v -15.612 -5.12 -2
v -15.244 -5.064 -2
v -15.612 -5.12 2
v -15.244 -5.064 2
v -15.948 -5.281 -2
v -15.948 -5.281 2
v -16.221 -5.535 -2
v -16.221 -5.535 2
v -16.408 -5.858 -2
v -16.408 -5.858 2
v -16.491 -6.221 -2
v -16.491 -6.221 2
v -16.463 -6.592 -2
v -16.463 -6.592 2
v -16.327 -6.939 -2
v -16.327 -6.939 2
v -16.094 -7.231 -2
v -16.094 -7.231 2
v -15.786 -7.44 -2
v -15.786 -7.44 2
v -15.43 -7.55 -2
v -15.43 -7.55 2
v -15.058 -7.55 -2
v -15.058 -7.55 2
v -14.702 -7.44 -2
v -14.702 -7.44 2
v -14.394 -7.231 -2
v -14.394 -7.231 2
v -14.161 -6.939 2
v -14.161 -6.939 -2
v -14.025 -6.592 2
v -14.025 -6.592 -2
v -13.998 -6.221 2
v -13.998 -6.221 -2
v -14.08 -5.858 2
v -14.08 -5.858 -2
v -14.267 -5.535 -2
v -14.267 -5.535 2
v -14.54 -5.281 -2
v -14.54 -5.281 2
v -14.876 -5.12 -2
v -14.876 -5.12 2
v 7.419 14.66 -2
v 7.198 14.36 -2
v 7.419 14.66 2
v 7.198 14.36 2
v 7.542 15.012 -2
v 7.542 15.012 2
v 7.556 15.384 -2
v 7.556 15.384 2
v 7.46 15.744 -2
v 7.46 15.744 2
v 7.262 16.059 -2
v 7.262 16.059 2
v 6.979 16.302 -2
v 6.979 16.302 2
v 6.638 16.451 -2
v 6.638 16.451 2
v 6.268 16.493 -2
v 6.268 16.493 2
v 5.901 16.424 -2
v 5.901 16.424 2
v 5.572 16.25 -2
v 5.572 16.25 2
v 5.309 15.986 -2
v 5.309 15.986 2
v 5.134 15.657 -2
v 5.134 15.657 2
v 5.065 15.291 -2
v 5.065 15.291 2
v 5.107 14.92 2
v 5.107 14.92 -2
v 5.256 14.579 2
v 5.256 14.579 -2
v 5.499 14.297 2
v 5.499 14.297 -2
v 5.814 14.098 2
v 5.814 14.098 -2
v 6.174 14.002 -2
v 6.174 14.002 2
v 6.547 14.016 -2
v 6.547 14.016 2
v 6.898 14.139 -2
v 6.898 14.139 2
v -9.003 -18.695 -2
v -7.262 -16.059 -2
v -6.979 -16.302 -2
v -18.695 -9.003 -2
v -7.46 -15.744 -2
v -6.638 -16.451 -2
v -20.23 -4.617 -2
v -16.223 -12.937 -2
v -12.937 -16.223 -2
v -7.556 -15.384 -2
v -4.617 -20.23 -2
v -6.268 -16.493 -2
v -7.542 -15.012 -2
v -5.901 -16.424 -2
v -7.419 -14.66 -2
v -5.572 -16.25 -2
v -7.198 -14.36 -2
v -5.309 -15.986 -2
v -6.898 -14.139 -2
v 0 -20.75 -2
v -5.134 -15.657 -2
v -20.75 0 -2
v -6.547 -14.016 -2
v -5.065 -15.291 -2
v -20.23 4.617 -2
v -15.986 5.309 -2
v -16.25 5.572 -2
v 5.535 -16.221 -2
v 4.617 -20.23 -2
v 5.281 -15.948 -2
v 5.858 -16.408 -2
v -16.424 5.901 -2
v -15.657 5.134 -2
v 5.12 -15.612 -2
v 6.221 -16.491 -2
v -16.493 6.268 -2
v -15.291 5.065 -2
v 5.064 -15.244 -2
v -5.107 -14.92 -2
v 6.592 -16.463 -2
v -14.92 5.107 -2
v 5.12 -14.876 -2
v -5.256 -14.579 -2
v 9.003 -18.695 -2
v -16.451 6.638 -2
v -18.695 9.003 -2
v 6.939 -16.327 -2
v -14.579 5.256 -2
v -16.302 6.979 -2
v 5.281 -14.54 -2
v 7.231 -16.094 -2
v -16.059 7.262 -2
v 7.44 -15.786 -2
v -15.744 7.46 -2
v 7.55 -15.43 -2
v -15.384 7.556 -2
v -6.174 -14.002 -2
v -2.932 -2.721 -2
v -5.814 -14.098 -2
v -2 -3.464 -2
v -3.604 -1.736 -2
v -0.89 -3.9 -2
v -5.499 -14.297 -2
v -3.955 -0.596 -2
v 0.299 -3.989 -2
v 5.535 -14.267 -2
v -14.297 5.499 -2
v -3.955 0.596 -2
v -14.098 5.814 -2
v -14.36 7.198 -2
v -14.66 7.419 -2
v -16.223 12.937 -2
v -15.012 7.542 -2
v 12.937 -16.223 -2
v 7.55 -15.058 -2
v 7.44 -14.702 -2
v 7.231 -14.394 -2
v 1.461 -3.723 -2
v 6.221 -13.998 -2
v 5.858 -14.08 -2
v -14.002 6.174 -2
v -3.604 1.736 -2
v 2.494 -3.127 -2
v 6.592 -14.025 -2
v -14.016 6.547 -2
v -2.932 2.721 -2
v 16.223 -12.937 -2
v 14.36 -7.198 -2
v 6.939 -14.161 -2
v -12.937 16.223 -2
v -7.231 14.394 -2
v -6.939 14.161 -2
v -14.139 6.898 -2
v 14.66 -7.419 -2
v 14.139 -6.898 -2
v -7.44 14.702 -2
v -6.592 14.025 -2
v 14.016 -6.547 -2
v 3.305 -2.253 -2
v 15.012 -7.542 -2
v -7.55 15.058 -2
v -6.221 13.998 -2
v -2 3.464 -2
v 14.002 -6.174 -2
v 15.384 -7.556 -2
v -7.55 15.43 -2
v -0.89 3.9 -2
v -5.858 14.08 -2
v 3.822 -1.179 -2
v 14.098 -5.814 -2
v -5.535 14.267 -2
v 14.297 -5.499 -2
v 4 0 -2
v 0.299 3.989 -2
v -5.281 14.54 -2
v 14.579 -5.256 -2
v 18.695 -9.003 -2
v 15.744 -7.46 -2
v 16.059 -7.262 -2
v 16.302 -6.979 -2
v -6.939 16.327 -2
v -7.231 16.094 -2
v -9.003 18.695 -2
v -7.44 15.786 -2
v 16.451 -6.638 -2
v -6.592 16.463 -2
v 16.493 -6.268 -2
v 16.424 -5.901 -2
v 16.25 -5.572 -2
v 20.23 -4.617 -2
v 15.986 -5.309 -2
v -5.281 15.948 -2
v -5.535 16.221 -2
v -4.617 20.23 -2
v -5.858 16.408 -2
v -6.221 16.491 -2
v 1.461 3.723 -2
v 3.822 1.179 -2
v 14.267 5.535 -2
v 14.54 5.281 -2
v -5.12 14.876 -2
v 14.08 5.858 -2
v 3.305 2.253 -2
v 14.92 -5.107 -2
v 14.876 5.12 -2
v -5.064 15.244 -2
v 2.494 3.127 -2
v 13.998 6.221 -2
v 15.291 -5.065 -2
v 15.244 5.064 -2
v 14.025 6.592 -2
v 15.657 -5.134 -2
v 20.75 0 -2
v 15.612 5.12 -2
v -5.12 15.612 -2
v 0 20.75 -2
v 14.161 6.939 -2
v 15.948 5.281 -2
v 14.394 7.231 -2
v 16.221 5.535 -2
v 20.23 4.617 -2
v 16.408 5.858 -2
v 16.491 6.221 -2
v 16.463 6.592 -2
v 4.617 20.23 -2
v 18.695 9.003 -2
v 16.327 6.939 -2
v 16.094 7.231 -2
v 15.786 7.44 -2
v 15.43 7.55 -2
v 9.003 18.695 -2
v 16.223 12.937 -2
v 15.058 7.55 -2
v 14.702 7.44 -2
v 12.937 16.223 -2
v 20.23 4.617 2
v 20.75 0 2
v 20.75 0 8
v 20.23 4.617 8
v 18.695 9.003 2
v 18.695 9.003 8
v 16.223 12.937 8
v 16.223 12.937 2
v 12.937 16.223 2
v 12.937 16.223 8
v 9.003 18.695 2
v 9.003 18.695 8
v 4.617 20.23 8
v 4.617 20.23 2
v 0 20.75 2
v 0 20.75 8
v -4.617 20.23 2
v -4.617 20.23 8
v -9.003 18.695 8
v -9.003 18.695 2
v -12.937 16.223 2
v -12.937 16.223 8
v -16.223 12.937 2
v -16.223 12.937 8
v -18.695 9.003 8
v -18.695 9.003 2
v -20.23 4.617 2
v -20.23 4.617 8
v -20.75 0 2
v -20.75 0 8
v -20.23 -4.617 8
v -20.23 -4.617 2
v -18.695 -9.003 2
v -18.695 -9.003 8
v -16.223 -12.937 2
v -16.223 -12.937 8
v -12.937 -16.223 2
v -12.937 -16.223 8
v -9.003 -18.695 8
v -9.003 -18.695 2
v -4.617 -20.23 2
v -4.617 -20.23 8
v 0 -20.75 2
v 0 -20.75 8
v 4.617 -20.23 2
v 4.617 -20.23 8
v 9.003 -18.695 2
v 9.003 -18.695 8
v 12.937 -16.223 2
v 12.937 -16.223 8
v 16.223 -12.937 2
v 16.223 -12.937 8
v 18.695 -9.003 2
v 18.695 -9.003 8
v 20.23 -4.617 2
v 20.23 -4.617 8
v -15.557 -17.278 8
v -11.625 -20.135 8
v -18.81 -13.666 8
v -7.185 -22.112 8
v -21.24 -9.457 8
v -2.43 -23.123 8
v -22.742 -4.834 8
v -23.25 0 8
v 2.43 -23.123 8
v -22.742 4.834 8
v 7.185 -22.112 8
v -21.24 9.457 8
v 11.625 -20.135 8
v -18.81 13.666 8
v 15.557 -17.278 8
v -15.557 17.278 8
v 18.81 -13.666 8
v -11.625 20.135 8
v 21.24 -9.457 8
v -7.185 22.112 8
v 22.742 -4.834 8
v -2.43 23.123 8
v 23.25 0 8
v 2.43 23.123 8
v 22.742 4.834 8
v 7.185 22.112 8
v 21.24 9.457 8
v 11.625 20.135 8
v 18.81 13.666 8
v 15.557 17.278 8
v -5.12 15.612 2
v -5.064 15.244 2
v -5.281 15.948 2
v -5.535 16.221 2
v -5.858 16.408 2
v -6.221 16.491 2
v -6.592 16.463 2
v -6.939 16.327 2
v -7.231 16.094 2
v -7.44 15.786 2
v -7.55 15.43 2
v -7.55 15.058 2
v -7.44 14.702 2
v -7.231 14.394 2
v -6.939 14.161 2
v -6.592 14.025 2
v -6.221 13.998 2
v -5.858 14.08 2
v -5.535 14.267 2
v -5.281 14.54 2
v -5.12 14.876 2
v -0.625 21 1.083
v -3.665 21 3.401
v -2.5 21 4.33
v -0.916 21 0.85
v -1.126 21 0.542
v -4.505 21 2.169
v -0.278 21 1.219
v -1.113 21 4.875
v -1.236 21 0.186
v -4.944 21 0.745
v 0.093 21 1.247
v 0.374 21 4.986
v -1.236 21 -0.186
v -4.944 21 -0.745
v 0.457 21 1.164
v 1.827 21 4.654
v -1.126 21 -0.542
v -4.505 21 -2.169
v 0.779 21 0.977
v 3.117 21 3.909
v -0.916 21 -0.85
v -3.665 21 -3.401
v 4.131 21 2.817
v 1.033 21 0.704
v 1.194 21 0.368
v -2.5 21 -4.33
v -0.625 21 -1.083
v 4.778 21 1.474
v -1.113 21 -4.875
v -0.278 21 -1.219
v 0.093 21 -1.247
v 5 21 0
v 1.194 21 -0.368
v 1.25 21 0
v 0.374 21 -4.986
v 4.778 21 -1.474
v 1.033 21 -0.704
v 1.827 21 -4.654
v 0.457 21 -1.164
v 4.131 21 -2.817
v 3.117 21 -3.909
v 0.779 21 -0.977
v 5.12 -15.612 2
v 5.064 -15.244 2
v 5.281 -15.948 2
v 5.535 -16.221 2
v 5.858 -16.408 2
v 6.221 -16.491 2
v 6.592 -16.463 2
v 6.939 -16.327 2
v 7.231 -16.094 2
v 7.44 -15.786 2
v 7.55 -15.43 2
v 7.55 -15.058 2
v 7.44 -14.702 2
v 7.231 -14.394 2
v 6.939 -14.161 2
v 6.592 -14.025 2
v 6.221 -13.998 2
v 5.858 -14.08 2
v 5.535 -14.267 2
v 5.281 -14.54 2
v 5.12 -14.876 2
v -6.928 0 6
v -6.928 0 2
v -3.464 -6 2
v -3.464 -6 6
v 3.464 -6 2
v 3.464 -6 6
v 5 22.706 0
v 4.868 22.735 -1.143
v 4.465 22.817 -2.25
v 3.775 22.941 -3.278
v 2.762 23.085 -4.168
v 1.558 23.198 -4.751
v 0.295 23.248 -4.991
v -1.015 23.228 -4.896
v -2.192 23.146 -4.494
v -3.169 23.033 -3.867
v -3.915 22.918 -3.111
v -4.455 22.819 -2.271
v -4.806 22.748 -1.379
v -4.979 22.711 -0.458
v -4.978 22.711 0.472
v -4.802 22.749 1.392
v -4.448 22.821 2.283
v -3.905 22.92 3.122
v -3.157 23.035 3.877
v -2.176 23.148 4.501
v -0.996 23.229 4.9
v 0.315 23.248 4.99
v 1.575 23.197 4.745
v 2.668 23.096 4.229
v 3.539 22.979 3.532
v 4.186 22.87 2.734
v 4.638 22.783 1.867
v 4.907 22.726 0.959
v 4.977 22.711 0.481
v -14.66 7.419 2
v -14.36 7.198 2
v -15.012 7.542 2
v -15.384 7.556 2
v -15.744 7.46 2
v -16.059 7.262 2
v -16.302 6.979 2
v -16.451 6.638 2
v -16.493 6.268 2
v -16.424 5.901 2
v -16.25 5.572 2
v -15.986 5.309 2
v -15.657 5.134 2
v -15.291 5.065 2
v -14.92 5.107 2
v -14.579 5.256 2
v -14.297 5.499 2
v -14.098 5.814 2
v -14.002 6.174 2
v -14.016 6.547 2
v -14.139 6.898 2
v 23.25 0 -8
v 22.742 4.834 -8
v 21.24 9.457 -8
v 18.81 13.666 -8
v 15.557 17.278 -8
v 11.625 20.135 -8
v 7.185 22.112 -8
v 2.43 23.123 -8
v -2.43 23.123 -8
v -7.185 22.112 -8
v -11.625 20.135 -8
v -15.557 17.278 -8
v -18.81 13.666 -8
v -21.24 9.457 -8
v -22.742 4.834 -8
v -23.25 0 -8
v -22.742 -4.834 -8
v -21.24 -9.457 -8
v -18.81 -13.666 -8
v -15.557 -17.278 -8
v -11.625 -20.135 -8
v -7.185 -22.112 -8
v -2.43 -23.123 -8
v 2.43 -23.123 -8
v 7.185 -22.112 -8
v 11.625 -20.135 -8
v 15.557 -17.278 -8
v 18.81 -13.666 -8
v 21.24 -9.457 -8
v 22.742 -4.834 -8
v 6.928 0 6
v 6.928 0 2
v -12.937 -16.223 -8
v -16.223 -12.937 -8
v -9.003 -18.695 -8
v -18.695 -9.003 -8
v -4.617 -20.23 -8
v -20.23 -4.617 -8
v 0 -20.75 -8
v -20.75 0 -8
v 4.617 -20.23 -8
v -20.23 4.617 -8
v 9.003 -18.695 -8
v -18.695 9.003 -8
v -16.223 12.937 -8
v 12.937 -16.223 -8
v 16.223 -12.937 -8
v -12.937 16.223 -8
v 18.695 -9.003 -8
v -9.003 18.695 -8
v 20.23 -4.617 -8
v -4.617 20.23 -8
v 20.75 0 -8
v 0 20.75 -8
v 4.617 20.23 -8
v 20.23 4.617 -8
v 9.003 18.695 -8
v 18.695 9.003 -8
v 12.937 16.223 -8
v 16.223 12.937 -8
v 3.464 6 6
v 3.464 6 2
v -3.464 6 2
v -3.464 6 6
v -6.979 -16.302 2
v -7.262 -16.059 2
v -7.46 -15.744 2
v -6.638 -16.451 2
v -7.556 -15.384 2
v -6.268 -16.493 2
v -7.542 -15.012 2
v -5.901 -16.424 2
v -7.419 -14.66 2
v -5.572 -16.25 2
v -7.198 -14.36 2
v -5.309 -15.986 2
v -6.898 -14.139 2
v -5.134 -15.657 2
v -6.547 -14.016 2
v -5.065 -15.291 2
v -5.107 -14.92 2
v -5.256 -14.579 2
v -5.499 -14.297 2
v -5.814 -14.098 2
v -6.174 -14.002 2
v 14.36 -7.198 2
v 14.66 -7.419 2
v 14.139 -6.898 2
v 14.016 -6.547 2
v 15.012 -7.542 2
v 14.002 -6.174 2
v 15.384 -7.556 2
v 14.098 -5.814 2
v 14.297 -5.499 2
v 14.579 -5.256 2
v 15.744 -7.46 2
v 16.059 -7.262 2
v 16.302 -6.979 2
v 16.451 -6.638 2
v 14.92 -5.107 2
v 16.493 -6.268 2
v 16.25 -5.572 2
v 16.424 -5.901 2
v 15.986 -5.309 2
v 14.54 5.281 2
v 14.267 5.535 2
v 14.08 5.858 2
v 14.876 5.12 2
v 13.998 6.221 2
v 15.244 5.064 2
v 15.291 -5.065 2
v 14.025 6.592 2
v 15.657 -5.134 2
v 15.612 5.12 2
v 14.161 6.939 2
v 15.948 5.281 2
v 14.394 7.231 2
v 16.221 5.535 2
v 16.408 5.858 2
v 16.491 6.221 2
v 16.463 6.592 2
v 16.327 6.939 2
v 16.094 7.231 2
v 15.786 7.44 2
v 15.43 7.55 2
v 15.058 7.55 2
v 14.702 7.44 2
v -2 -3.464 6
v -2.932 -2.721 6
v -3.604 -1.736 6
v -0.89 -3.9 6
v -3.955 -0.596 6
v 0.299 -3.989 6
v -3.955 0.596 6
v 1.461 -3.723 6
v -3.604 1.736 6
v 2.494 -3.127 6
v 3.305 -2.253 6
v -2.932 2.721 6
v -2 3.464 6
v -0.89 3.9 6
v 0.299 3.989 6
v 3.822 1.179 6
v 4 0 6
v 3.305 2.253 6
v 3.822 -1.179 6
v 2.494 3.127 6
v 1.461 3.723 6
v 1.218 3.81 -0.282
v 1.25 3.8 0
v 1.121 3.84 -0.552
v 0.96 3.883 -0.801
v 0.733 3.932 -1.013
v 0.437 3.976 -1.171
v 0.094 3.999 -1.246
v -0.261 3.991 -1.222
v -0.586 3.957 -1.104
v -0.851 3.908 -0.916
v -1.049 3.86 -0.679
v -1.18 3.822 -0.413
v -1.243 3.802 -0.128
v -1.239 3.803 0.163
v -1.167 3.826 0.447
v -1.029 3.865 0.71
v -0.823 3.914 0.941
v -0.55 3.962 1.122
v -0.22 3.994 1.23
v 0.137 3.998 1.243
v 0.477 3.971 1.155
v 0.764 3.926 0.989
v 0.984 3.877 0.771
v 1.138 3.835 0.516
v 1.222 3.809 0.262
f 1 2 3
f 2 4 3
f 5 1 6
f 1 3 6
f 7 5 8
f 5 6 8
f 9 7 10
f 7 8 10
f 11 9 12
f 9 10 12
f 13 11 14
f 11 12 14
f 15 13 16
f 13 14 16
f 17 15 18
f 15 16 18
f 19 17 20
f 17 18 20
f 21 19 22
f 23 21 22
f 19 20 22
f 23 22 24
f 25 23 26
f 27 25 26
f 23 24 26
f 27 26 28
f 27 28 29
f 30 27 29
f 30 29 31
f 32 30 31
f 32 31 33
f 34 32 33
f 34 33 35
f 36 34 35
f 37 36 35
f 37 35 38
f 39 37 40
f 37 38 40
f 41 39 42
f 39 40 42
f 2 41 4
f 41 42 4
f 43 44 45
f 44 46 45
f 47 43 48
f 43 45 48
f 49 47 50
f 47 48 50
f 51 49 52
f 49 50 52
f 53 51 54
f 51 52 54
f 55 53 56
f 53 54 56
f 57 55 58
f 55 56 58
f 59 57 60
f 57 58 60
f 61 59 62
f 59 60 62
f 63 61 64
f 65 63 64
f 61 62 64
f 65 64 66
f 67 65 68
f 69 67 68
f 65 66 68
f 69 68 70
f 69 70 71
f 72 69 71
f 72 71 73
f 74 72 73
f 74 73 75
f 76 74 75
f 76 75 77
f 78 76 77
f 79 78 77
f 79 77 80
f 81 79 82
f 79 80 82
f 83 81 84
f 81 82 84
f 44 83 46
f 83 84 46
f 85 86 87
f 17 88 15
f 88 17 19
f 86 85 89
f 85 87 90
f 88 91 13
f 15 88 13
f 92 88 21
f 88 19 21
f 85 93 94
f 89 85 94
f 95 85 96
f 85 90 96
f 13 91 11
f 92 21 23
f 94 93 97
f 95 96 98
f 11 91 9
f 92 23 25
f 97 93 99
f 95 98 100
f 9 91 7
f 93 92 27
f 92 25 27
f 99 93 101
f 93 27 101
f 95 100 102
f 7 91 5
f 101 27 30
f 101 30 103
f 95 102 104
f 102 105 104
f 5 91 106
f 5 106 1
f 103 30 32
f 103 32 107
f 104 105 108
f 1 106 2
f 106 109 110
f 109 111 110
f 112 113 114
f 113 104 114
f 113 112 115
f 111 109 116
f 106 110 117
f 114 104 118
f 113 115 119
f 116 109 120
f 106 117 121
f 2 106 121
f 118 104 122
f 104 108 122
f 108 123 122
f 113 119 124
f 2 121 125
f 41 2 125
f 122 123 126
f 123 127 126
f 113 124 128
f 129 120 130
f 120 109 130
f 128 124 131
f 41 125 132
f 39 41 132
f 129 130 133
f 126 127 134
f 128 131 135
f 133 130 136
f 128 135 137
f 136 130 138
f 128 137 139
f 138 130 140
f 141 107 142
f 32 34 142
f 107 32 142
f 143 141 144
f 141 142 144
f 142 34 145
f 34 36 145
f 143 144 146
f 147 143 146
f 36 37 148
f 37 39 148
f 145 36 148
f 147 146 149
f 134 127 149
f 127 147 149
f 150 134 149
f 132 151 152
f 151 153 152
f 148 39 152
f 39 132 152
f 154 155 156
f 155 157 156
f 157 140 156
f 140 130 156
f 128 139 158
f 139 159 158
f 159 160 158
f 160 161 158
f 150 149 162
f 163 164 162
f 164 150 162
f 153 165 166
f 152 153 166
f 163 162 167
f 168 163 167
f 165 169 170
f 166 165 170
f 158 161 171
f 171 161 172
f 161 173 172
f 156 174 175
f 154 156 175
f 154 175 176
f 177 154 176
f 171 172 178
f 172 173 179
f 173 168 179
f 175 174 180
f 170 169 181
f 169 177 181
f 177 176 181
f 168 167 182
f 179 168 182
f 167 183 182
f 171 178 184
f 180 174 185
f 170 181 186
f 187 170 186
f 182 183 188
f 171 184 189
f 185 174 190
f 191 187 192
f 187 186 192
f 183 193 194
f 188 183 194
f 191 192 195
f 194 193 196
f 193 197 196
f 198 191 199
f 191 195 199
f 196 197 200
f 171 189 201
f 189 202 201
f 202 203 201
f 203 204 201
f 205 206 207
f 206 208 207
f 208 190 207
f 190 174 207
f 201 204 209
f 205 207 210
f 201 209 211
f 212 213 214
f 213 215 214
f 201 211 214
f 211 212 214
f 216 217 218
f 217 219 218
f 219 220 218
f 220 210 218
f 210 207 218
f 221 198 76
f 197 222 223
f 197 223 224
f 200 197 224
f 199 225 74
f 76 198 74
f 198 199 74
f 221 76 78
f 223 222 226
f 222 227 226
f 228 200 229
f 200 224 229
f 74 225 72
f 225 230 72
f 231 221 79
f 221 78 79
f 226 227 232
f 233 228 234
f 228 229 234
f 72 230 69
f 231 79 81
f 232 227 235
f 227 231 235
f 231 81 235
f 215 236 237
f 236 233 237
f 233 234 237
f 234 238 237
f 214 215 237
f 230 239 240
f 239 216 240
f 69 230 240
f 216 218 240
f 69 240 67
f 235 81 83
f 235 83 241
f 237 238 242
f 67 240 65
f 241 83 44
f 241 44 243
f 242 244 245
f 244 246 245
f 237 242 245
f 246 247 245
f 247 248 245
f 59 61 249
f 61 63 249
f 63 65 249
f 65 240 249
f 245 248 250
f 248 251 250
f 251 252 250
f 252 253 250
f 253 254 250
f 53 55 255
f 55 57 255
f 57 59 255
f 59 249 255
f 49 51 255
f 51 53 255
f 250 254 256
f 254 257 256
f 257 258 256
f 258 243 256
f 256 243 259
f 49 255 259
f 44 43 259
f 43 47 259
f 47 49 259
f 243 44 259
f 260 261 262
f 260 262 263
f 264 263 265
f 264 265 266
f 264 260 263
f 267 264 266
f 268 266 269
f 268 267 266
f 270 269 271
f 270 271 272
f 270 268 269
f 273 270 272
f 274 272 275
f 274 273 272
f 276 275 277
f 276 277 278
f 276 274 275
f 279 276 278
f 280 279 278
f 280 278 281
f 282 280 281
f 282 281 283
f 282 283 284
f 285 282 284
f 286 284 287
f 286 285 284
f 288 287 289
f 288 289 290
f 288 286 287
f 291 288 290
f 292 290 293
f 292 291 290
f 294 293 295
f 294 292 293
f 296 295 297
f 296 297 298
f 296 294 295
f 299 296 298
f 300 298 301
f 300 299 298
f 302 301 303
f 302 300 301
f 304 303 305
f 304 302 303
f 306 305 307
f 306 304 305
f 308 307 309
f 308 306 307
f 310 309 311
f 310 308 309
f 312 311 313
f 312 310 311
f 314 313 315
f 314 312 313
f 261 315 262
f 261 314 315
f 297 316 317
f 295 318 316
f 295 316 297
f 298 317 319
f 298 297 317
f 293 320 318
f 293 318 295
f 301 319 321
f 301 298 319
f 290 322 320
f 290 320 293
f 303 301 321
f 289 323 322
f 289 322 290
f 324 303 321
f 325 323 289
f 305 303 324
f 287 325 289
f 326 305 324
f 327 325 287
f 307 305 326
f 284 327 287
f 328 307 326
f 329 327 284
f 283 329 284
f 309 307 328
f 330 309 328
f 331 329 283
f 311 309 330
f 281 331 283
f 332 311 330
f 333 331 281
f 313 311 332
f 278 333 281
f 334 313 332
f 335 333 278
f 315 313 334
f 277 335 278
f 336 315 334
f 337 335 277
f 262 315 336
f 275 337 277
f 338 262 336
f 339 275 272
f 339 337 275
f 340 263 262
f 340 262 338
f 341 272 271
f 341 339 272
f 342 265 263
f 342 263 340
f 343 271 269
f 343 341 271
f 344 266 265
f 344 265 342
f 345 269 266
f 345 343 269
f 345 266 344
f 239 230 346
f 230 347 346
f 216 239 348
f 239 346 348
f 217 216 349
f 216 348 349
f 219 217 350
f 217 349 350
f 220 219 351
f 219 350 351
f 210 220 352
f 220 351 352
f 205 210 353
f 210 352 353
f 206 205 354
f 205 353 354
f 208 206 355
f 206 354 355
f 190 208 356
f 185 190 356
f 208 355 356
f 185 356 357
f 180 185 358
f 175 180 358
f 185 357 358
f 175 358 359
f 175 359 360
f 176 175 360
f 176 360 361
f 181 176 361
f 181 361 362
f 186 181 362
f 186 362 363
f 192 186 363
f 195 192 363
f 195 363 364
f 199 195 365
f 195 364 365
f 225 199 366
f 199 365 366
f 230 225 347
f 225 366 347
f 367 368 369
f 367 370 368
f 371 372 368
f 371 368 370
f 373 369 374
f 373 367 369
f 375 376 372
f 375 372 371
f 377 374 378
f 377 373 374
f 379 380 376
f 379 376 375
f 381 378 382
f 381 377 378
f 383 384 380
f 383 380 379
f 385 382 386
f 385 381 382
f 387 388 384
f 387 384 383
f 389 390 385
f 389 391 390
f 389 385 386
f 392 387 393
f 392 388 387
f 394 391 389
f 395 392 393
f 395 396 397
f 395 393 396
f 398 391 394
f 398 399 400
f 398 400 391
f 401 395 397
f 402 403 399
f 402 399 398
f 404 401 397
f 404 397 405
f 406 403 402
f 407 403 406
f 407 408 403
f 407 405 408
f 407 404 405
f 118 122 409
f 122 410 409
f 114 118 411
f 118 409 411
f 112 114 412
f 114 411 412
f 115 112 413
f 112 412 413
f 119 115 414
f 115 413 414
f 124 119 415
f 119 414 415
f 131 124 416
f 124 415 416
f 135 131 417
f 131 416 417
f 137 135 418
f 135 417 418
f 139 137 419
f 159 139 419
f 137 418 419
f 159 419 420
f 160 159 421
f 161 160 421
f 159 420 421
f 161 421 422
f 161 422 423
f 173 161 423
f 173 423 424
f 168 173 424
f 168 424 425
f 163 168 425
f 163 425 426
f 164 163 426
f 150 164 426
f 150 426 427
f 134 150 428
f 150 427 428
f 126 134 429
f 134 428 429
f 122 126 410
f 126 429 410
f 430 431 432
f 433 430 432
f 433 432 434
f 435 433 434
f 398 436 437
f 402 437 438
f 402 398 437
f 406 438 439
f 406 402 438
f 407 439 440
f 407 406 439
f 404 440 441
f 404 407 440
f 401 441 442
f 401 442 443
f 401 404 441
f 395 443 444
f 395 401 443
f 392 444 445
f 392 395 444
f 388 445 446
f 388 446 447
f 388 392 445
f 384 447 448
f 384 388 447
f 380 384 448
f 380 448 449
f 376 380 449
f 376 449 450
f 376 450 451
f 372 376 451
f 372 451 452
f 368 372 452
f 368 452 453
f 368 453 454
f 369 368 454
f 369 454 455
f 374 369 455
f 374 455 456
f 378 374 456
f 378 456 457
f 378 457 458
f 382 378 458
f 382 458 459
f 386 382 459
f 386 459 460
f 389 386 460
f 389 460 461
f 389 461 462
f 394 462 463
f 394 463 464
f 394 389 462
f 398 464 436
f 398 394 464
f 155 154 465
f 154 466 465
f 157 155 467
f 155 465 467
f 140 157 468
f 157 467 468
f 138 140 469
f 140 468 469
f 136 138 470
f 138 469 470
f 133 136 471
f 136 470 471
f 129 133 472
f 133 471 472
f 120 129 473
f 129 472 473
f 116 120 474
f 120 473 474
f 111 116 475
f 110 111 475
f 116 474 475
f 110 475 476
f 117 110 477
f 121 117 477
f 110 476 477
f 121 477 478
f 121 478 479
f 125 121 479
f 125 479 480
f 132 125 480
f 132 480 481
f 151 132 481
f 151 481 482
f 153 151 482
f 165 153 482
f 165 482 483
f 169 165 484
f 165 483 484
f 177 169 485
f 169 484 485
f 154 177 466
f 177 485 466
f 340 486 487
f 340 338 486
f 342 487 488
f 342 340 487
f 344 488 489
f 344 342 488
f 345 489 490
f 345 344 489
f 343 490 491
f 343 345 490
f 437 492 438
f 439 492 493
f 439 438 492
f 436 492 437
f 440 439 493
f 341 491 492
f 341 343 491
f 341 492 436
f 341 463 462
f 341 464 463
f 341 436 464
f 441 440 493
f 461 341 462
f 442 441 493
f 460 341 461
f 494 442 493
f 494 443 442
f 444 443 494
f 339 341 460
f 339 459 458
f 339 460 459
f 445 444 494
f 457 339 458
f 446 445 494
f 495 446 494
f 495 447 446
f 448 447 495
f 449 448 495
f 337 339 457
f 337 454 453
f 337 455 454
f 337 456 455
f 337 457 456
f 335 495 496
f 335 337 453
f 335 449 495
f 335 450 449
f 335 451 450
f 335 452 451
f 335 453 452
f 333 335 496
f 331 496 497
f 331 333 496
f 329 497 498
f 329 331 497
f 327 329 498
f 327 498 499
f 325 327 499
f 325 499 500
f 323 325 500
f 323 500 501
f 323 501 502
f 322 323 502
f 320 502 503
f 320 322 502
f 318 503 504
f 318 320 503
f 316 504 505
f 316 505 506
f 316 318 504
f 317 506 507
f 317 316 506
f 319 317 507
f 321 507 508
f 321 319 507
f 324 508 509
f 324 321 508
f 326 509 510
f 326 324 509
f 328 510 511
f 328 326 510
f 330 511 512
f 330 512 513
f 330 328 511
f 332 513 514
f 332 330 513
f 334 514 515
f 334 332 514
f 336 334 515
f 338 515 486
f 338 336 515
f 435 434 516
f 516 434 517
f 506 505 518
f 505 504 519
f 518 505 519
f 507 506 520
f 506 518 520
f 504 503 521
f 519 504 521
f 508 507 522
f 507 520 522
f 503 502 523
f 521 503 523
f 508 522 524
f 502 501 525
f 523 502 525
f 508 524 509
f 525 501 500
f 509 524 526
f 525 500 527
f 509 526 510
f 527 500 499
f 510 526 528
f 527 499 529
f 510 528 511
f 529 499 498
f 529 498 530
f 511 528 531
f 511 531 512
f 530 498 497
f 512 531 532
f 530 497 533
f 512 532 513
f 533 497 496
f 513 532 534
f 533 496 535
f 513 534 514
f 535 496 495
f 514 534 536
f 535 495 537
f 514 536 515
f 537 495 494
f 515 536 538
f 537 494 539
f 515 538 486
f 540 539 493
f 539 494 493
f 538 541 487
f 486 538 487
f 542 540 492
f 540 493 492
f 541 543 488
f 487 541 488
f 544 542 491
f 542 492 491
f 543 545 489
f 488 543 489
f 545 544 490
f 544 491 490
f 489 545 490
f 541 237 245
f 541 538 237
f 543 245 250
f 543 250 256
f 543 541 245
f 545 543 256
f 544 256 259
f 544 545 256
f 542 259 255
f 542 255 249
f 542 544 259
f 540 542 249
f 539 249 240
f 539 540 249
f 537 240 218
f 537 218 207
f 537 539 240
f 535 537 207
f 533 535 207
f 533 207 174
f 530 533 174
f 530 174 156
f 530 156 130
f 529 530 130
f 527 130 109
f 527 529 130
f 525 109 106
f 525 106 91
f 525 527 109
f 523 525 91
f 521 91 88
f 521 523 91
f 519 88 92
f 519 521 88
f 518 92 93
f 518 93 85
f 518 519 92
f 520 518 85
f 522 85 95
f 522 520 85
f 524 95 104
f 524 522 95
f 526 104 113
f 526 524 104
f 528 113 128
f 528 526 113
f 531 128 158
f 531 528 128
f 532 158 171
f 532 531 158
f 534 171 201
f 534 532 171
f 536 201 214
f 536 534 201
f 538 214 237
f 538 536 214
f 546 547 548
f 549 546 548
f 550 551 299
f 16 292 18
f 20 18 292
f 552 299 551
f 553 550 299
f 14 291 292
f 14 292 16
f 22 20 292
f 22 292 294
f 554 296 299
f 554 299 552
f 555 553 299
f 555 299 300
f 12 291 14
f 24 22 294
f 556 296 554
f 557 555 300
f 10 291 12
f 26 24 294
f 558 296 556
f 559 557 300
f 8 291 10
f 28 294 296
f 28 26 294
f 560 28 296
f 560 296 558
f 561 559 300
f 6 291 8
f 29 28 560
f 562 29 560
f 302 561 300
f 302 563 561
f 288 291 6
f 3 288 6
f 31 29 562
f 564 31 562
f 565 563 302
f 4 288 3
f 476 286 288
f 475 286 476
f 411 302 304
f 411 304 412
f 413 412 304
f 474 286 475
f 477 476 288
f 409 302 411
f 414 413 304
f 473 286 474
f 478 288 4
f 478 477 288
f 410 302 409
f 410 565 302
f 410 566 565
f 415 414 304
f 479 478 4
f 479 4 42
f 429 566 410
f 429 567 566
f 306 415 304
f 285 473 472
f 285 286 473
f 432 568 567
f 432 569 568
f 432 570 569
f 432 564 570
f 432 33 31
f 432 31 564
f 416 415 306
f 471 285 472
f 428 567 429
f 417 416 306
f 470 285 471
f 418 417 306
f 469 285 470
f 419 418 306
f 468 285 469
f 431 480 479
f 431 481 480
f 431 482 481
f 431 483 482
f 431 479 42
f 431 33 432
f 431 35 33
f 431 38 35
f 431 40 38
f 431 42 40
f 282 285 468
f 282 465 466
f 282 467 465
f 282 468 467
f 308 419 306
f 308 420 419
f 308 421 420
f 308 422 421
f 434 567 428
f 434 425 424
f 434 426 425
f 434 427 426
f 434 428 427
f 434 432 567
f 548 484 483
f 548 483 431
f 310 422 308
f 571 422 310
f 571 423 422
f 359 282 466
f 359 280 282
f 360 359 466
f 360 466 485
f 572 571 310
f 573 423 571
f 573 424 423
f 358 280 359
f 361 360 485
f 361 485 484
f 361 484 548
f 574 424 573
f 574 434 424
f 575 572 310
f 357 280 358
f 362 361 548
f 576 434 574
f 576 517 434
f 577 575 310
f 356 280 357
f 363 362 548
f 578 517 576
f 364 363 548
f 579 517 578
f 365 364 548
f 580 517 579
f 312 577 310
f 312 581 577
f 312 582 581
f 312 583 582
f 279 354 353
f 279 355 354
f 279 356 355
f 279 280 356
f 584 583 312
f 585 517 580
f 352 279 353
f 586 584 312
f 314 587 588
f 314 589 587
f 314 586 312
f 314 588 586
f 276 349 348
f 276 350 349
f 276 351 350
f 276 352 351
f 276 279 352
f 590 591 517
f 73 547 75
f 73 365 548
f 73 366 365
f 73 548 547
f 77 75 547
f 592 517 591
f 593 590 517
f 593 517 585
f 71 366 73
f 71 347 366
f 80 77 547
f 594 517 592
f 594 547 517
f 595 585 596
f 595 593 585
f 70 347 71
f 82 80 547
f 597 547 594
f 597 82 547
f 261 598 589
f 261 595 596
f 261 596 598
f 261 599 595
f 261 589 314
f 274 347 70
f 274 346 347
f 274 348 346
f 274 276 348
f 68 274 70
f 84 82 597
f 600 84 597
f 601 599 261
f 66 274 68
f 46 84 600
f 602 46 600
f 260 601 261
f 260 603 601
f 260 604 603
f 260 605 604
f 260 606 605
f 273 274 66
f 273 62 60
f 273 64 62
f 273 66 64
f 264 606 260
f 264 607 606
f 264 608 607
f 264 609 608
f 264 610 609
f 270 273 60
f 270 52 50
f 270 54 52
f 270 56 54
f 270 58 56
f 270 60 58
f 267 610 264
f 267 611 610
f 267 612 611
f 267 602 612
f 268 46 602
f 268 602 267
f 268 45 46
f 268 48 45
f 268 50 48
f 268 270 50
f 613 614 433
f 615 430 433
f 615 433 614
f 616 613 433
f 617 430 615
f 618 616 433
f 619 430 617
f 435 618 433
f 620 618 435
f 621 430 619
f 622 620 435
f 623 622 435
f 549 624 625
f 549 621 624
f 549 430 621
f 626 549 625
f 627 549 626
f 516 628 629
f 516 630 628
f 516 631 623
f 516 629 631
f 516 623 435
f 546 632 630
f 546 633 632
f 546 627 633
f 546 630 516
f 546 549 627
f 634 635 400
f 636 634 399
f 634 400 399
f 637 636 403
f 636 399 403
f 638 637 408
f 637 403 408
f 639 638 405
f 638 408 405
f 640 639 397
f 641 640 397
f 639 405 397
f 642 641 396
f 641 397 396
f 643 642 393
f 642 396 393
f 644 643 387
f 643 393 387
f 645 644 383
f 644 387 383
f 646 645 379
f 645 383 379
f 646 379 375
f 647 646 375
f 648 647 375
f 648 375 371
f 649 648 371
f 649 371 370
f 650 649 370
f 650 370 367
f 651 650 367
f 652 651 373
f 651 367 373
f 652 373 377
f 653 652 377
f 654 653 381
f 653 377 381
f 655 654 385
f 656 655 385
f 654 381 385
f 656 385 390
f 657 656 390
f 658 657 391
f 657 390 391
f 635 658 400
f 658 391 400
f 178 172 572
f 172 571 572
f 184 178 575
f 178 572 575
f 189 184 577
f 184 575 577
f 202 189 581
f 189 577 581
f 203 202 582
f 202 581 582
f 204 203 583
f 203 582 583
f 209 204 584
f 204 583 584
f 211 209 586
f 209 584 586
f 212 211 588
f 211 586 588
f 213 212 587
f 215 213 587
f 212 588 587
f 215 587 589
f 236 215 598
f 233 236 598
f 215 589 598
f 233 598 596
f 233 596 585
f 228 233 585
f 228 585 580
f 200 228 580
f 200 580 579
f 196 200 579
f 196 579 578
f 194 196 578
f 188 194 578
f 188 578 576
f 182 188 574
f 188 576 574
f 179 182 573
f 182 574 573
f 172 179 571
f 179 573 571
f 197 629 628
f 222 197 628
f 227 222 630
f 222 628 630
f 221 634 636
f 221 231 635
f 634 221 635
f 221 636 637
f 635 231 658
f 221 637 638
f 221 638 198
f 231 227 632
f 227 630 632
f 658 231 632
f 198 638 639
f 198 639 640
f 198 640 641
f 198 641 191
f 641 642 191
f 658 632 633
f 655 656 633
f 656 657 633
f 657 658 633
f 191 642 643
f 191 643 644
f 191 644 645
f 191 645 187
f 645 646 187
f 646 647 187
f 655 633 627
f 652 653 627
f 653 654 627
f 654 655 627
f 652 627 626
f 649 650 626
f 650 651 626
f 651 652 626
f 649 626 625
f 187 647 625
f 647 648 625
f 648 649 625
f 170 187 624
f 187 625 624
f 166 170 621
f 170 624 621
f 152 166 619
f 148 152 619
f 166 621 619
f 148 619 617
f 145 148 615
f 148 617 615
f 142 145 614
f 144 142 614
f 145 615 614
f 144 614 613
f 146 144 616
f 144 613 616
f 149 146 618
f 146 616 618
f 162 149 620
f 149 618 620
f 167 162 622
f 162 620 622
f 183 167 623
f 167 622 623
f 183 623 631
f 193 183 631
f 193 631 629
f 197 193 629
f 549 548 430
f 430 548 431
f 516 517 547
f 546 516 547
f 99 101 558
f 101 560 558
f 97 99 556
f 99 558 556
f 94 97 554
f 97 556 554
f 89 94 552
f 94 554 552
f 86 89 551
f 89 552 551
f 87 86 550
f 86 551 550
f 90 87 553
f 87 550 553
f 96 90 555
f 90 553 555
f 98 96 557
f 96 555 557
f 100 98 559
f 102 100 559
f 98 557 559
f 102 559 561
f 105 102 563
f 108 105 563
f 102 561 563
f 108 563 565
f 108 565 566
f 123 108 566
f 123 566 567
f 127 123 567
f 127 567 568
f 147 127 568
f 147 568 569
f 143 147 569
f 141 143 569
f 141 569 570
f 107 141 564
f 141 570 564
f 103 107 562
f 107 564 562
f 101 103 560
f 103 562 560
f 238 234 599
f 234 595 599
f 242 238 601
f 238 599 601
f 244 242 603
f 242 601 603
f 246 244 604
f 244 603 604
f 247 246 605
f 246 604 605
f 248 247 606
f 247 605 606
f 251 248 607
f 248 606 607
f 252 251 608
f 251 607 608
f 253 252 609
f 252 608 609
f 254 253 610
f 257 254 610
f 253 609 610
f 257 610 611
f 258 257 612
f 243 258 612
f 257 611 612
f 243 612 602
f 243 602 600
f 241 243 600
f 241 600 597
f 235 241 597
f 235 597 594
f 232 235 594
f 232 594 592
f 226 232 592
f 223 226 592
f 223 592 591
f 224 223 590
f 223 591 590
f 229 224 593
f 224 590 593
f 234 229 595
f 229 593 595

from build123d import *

# Parameters (mm, degrees)
ESQUISSE1_R           = 23.25
ESQUISSE1_R_2         = 20.75
MAIN_DEPTH            = 8
ESQUISSE2_R           = 20.75
CENTRALPART_DEPTH     = 2
HEXAGONAL_DEPTH       = 6
ESQUISSE5_R           = 4
CENTRALHOLE_DEPTH     = 6
SKETCH1_R             = 1.25
FIXTOPHOLE_DEPTH      = 3.25
FIXTOPHOLE_DEPTH_BACK = 22
SKETCH2_R             = 5
CUT_EXTRUDE2_DEPTH    = 3.250000111
SKETCH3_R             = 1.25
HUBFIXHOLE_DEPTH      = 9.0000001
CIRPATTERN1_COUNT     = 8


with BuildPart() as part:
    # Esquisse1 → Main (new body, symmetric)
    with BuildSketch(Plane.XY):
        Circle(ESQUISSE1_R)
        Circle(ESQUISSE1_R_2, mode=Mode.SUBTRACT)
    extrude(amount=MAIN_DEPTH, both=True)

    # Esquisse2 → CentralPart (add, symmetric)
    with BuildSketch(Plane.XY):
        Circle(ESQUISSE2_R)
    extrude(amount=CENTRALPART_DEPTH, both=True)

    # Esquisse3 → Hexagonal (add)
    with BuildSketch(Plane.XY):
        Polygon((-3.464101615, 6), (-6.92820323, 0), (-3.464101615, -6), (3.464101615, -6), (6.92820323, 0), (3.464101615, 6), align=None)
    extrude(amount=HEXAGONAL_DEPTH)

    # Esquisse5 → CentralHole (cut, symmetric)
    with BuildSketch(Plane.XY):
        Circle(ESQUISSE5_R)
    extrude(amount=CENTRALHOLE_DEPTH, both=True, mode=Mode.SUBTRACT)

    # Sketch1 → FixTopHole (cut, two sides)
    with BuildSketch(Plane(origin=(0, 21, 0), x_dir=(1, 0, 0), z_dir=(0, 1, 0))) as fixtophole_sk:
        Circle(SKETCH1_R)
    extrude(amount=FIXTOPHOLE_DEPTH, mode=Mode.SUBTRACT)
    extrude(fixtophole_sk.sketch, amount=-FIXTOPHOLE_DEPTH_BACK, mode=Mode.SUBTRACT)

    # Sketch2 → Cut-Extrude2 (cut, through all)
    with BuildSketch(Plane(origin=(0, 21, 0), x_dir=(1, 0, 0), z_dir=(0, 1, 0))):
        Circle(SKETCH2_R)
    extrude(amount=CUT_EXTRUDE2_DEPTH, mode=Mode.SUBTRACT)

    # Sketch3 → HubFixHole (cut, symmetric)
    with BuildSketch(Plane.XY):
        with Locations((-6.314276634, 15.244012286)):
            Circle(SKETCH3_R)
    hubfixhole = extrude(amount=HUBFIXHOLE_DEPTH, both=True, mode=Mode.SUBTRACT)

    # CirPattern1: HubFixHole ×8 about axis
    cirpattern1_axis = Axis((0, 0, 0), (0, 0, 1))
    for i in range(1, CIRPATTERN1_COUNT):
        add(hubfixhole.rotate(cirpattern1_axis, i * 360 / CIRPATTERN1_COUNT), mode=Mode.SUBTRACT)


solid = part.part
